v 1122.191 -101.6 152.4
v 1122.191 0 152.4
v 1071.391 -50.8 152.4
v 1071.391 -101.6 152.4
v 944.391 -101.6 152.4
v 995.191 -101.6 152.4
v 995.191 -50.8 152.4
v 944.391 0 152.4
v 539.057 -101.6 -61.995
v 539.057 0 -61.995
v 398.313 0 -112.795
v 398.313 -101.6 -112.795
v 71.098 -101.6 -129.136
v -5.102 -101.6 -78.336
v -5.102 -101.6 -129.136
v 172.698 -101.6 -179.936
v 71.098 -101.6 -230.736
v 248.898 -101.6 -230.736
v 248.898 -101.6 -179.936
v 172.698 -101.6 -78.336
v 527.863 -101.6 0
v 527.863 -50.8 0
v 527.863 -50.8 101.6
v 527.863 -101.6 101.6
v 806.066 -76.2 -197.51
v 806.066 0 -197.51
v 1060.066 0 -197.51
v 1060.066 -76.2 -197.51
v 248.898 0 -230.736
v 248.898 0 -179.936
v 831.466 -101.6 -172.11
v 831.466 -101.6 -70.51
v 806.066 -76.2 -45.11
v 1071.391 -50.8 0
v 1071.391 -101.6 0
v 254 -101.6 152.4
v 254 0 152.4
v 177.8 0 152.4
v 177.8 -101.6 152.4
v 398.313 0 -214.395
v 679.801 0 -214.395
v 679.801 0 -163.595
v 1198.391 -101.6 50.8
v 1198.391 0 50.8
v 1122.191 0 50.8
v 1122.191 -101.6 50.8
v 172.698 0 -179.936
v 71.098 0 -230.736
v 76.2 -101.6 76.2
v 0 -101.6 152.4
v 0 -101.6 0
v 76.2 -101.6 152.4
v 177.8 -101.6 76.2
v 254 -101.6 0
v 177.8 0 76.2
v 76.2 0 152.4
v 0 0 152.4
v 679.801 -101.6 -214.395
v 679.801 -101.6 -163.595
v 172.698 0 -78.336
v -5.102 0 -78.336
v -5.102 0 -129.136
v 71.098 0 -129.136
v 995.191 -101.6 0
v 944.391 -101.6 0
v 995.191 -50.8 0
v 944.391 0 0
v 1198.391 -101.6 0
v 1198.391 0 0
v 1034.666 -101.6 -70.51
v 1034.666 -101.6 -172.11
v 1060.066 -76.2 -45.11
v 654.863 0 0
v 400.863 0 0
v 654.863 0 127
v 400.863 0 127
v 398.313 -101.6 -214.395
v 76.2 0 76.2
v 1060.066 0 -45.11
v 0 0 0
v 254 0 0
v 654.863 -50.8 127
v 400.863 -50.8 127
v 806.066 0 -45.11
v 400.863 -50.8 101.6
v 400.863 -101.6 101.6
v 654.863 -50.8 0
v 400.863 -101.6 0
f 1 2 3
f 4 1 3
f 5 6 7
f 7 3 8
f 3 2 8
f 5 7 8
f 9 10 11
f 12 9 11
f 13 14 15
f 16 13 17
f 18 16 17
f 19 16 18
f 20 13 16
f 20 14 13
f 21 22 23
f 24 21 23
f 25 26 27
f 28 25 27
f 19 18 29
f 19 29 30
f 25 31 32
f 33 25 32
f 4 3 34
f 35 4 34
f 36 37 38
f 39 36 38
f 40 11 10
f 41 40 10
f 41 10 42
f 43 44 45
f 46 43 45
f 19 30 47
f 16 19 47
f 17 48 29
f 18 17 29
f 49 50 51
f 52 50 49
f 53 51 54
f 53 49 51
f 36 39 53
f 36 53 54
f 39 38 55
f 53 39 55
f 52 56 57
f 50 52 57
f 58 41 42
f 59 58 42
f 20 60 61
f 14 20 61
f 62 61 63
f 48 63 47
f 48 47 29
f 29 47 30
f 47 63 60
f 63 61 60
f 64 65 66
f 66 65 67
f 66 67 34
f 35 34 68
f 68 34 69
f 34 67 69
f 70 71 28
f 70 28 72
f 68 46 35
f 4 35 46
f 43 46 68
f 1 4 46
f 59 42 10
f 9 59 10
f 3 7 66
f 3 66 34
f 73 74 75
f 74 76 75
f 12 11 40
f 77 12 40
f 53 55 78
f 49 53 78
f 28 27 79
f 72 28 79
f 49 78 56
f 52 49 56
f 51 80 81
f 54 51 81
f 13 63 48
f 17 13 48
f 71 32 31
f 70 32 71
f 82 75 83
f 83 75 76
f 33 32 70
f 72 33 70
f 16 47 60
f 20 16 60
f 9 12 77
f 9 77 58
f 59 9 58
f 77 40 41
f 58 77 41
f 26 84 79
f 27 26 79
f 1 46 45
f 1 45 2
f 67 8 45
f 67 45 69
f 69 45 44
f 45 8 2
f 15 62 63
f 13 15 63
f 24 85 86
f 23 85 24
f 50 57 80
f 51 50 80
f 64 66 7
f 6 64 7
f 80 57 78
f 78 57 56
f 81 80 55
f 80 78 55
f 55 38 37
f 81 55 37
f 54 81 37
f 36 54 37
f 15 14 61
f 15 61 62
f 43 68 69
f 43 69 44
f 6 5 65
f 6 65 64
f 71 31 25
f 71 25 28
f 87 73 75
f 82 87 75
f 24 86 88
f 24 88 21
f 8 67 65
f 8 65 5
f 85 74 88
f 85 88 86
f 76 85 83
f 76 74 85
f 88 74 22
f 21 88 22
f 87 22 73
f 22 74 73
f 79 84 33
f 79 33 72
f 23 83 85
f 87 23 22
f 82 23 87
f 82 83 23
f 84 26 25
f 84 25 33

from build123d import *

# Parameters (mm, degrees)
F1_DEPTH  = 101.6
F4_DEPTH  = 50.8
F2_W      = 127
F2_H      = 101.6
F5_DEPTH  = 101.6
F3_W      = 50.8
F3_H      = 152.4
F6_DEPTH  = 101.6
F3_W_2    = 76.2
F7_DEPTH  = 25.4
F8_DEPTH  = 50.8
F9_DEPTH  = 76.2
F11_DEPTH = 101.6
F13_DEPTH = 101.6
F14_W     = 254
F14_H     = 152.4
F15_DEPTH = 101.6
F16_SIZE  = 25.4


with BuildPart() as f1:
    # F0 (on Front) → F1 (new body)
    with BuildSketch(Plane.XZ):
        Polygon((0, 152.4), (0, 0), (254, 0), (254, 152.4), (177.8, 152.4), (177.8, 76.2), (76.2, 76.2), (76.2, 152.4), align=None)
    extrude(amount=F1_DEPTH)


with BuildPart() as f4:
    # F2 (on Front) → F4 (new body)
    with BuildSketch(Plane.XZ):
        Polygon((654.862545, 127), (400.862545, 127), (400.862545, 101.6), (527.862545, 101.6), (527.862545, 0), (654.862545, 0), align=None)
    extrude(amount=F4_DEPTH)

    # F2 (on Front) → F5 (join)
    with BuildSketch(Plane.XZ):
        with Locations((464.362545, 50.8)):
            Rectangle(F2_W, F2_H)
    extrude(amount=F5_DEPTH)


with BuildPart() as f6:
    # F3 (on Front) → F6 (new body)
    with BuildSketch(Plane.XZ):
        with Locations((969.790904, 76.2)):
            Rectangle(F3_W, F3_H)
    extrude(amount=F6_DEPTH)

    # F3 (on Front) → F7 (join)
    with BuildSketch(Plane.XZ):
        with Locations((969.790904, 76.2)):
            Rectangle(F3_W, F3_H)
        with Locations((1033.290904, 76.2)):
            Rectangle(F3_W_2, F3_H)
        Polygon((1071.390904, 152.4), (1071.390904, 0), (1198.390904, 0), (1198.390904, 50.8), (1122.190904, 50.8), (1122.190904, 152.4), align=None)
    extrude(amount=F7_DEPTH)

    # F3 (on Front) → F8 (join)
    with BuildSketch(Plane.XZ):
        with Locations((1033.290904, 76.2)):
            Rectangle(F3_W_2, F3_H)
    extrude(amount=F8_DEPTH)

    # F7_face (on face) → F9 (join)
    with BuildSketch(Plane(origin=(1117.957571, -25.4, 59.266667), x_dir=(1, 0, 0), z_dir=(0, -1, 0))):
        Polygon((4.233333, 93.133333), (-46.566667, 93.133333), (-46.566667, -59.266667), (80.433333, -59.266667), (80.433333, -8.466667), (4.233333, -8.466667), align=None)
    extrude(amount=F9_DEPTH)


with BuildPart() as f11:
    # F10 (on Front) → F11 (new body)
    with BuildSketch(Plane.XZ):
        Polygon((172.698206, -78.335609), (-5.101794, -78.335609), (-5.101794, -129.135609), (71.098206, -129.135609), (71.098206, -230.735609), (248.898206, -230.735609), (248.898206, -179.935609), (172.698206, -179.935609), align=None)
    extrude(amount=F11_DEPTH)


with BuildPart() as f13:
    # F12 (on Front) → F13 (new body)
    with BuildSketch(Plane.XZ):
        Polygon((539.057255, -61.995472), (398.313224, -112.795472), (398.313224, -214.395472), (679.801285, -214.395472), (679.801285, -163.595472), align=None)
    extrude(amount=F13_DEPTH)


with BuildPart() as f15:
    # F14 (on Front) → F15 (new body)
    with BuildSketch(Plane.XZ):
        with Locations((933.066334, -121.310228)):
            Rectangle(F14_W, F14_H)
    extrude(amount=F15_DEPTH)

    # F16
    f16_edges = [f15.edges().sort_by_distance(p)[0] for p in [
        (933.066334, -101.6, -45.110228),
        (806.066334, -101.6, -121.310228),
        (933.066334, -101.6, -197.510228),
        (1060.066334, -101.6, -121.310228),
    ]]
    chamfer(f16_edges, length=F16_SIZE)


solid = Compound([f1.part, f4.part, f6.part, f11.part, f13.part, f15.part])
